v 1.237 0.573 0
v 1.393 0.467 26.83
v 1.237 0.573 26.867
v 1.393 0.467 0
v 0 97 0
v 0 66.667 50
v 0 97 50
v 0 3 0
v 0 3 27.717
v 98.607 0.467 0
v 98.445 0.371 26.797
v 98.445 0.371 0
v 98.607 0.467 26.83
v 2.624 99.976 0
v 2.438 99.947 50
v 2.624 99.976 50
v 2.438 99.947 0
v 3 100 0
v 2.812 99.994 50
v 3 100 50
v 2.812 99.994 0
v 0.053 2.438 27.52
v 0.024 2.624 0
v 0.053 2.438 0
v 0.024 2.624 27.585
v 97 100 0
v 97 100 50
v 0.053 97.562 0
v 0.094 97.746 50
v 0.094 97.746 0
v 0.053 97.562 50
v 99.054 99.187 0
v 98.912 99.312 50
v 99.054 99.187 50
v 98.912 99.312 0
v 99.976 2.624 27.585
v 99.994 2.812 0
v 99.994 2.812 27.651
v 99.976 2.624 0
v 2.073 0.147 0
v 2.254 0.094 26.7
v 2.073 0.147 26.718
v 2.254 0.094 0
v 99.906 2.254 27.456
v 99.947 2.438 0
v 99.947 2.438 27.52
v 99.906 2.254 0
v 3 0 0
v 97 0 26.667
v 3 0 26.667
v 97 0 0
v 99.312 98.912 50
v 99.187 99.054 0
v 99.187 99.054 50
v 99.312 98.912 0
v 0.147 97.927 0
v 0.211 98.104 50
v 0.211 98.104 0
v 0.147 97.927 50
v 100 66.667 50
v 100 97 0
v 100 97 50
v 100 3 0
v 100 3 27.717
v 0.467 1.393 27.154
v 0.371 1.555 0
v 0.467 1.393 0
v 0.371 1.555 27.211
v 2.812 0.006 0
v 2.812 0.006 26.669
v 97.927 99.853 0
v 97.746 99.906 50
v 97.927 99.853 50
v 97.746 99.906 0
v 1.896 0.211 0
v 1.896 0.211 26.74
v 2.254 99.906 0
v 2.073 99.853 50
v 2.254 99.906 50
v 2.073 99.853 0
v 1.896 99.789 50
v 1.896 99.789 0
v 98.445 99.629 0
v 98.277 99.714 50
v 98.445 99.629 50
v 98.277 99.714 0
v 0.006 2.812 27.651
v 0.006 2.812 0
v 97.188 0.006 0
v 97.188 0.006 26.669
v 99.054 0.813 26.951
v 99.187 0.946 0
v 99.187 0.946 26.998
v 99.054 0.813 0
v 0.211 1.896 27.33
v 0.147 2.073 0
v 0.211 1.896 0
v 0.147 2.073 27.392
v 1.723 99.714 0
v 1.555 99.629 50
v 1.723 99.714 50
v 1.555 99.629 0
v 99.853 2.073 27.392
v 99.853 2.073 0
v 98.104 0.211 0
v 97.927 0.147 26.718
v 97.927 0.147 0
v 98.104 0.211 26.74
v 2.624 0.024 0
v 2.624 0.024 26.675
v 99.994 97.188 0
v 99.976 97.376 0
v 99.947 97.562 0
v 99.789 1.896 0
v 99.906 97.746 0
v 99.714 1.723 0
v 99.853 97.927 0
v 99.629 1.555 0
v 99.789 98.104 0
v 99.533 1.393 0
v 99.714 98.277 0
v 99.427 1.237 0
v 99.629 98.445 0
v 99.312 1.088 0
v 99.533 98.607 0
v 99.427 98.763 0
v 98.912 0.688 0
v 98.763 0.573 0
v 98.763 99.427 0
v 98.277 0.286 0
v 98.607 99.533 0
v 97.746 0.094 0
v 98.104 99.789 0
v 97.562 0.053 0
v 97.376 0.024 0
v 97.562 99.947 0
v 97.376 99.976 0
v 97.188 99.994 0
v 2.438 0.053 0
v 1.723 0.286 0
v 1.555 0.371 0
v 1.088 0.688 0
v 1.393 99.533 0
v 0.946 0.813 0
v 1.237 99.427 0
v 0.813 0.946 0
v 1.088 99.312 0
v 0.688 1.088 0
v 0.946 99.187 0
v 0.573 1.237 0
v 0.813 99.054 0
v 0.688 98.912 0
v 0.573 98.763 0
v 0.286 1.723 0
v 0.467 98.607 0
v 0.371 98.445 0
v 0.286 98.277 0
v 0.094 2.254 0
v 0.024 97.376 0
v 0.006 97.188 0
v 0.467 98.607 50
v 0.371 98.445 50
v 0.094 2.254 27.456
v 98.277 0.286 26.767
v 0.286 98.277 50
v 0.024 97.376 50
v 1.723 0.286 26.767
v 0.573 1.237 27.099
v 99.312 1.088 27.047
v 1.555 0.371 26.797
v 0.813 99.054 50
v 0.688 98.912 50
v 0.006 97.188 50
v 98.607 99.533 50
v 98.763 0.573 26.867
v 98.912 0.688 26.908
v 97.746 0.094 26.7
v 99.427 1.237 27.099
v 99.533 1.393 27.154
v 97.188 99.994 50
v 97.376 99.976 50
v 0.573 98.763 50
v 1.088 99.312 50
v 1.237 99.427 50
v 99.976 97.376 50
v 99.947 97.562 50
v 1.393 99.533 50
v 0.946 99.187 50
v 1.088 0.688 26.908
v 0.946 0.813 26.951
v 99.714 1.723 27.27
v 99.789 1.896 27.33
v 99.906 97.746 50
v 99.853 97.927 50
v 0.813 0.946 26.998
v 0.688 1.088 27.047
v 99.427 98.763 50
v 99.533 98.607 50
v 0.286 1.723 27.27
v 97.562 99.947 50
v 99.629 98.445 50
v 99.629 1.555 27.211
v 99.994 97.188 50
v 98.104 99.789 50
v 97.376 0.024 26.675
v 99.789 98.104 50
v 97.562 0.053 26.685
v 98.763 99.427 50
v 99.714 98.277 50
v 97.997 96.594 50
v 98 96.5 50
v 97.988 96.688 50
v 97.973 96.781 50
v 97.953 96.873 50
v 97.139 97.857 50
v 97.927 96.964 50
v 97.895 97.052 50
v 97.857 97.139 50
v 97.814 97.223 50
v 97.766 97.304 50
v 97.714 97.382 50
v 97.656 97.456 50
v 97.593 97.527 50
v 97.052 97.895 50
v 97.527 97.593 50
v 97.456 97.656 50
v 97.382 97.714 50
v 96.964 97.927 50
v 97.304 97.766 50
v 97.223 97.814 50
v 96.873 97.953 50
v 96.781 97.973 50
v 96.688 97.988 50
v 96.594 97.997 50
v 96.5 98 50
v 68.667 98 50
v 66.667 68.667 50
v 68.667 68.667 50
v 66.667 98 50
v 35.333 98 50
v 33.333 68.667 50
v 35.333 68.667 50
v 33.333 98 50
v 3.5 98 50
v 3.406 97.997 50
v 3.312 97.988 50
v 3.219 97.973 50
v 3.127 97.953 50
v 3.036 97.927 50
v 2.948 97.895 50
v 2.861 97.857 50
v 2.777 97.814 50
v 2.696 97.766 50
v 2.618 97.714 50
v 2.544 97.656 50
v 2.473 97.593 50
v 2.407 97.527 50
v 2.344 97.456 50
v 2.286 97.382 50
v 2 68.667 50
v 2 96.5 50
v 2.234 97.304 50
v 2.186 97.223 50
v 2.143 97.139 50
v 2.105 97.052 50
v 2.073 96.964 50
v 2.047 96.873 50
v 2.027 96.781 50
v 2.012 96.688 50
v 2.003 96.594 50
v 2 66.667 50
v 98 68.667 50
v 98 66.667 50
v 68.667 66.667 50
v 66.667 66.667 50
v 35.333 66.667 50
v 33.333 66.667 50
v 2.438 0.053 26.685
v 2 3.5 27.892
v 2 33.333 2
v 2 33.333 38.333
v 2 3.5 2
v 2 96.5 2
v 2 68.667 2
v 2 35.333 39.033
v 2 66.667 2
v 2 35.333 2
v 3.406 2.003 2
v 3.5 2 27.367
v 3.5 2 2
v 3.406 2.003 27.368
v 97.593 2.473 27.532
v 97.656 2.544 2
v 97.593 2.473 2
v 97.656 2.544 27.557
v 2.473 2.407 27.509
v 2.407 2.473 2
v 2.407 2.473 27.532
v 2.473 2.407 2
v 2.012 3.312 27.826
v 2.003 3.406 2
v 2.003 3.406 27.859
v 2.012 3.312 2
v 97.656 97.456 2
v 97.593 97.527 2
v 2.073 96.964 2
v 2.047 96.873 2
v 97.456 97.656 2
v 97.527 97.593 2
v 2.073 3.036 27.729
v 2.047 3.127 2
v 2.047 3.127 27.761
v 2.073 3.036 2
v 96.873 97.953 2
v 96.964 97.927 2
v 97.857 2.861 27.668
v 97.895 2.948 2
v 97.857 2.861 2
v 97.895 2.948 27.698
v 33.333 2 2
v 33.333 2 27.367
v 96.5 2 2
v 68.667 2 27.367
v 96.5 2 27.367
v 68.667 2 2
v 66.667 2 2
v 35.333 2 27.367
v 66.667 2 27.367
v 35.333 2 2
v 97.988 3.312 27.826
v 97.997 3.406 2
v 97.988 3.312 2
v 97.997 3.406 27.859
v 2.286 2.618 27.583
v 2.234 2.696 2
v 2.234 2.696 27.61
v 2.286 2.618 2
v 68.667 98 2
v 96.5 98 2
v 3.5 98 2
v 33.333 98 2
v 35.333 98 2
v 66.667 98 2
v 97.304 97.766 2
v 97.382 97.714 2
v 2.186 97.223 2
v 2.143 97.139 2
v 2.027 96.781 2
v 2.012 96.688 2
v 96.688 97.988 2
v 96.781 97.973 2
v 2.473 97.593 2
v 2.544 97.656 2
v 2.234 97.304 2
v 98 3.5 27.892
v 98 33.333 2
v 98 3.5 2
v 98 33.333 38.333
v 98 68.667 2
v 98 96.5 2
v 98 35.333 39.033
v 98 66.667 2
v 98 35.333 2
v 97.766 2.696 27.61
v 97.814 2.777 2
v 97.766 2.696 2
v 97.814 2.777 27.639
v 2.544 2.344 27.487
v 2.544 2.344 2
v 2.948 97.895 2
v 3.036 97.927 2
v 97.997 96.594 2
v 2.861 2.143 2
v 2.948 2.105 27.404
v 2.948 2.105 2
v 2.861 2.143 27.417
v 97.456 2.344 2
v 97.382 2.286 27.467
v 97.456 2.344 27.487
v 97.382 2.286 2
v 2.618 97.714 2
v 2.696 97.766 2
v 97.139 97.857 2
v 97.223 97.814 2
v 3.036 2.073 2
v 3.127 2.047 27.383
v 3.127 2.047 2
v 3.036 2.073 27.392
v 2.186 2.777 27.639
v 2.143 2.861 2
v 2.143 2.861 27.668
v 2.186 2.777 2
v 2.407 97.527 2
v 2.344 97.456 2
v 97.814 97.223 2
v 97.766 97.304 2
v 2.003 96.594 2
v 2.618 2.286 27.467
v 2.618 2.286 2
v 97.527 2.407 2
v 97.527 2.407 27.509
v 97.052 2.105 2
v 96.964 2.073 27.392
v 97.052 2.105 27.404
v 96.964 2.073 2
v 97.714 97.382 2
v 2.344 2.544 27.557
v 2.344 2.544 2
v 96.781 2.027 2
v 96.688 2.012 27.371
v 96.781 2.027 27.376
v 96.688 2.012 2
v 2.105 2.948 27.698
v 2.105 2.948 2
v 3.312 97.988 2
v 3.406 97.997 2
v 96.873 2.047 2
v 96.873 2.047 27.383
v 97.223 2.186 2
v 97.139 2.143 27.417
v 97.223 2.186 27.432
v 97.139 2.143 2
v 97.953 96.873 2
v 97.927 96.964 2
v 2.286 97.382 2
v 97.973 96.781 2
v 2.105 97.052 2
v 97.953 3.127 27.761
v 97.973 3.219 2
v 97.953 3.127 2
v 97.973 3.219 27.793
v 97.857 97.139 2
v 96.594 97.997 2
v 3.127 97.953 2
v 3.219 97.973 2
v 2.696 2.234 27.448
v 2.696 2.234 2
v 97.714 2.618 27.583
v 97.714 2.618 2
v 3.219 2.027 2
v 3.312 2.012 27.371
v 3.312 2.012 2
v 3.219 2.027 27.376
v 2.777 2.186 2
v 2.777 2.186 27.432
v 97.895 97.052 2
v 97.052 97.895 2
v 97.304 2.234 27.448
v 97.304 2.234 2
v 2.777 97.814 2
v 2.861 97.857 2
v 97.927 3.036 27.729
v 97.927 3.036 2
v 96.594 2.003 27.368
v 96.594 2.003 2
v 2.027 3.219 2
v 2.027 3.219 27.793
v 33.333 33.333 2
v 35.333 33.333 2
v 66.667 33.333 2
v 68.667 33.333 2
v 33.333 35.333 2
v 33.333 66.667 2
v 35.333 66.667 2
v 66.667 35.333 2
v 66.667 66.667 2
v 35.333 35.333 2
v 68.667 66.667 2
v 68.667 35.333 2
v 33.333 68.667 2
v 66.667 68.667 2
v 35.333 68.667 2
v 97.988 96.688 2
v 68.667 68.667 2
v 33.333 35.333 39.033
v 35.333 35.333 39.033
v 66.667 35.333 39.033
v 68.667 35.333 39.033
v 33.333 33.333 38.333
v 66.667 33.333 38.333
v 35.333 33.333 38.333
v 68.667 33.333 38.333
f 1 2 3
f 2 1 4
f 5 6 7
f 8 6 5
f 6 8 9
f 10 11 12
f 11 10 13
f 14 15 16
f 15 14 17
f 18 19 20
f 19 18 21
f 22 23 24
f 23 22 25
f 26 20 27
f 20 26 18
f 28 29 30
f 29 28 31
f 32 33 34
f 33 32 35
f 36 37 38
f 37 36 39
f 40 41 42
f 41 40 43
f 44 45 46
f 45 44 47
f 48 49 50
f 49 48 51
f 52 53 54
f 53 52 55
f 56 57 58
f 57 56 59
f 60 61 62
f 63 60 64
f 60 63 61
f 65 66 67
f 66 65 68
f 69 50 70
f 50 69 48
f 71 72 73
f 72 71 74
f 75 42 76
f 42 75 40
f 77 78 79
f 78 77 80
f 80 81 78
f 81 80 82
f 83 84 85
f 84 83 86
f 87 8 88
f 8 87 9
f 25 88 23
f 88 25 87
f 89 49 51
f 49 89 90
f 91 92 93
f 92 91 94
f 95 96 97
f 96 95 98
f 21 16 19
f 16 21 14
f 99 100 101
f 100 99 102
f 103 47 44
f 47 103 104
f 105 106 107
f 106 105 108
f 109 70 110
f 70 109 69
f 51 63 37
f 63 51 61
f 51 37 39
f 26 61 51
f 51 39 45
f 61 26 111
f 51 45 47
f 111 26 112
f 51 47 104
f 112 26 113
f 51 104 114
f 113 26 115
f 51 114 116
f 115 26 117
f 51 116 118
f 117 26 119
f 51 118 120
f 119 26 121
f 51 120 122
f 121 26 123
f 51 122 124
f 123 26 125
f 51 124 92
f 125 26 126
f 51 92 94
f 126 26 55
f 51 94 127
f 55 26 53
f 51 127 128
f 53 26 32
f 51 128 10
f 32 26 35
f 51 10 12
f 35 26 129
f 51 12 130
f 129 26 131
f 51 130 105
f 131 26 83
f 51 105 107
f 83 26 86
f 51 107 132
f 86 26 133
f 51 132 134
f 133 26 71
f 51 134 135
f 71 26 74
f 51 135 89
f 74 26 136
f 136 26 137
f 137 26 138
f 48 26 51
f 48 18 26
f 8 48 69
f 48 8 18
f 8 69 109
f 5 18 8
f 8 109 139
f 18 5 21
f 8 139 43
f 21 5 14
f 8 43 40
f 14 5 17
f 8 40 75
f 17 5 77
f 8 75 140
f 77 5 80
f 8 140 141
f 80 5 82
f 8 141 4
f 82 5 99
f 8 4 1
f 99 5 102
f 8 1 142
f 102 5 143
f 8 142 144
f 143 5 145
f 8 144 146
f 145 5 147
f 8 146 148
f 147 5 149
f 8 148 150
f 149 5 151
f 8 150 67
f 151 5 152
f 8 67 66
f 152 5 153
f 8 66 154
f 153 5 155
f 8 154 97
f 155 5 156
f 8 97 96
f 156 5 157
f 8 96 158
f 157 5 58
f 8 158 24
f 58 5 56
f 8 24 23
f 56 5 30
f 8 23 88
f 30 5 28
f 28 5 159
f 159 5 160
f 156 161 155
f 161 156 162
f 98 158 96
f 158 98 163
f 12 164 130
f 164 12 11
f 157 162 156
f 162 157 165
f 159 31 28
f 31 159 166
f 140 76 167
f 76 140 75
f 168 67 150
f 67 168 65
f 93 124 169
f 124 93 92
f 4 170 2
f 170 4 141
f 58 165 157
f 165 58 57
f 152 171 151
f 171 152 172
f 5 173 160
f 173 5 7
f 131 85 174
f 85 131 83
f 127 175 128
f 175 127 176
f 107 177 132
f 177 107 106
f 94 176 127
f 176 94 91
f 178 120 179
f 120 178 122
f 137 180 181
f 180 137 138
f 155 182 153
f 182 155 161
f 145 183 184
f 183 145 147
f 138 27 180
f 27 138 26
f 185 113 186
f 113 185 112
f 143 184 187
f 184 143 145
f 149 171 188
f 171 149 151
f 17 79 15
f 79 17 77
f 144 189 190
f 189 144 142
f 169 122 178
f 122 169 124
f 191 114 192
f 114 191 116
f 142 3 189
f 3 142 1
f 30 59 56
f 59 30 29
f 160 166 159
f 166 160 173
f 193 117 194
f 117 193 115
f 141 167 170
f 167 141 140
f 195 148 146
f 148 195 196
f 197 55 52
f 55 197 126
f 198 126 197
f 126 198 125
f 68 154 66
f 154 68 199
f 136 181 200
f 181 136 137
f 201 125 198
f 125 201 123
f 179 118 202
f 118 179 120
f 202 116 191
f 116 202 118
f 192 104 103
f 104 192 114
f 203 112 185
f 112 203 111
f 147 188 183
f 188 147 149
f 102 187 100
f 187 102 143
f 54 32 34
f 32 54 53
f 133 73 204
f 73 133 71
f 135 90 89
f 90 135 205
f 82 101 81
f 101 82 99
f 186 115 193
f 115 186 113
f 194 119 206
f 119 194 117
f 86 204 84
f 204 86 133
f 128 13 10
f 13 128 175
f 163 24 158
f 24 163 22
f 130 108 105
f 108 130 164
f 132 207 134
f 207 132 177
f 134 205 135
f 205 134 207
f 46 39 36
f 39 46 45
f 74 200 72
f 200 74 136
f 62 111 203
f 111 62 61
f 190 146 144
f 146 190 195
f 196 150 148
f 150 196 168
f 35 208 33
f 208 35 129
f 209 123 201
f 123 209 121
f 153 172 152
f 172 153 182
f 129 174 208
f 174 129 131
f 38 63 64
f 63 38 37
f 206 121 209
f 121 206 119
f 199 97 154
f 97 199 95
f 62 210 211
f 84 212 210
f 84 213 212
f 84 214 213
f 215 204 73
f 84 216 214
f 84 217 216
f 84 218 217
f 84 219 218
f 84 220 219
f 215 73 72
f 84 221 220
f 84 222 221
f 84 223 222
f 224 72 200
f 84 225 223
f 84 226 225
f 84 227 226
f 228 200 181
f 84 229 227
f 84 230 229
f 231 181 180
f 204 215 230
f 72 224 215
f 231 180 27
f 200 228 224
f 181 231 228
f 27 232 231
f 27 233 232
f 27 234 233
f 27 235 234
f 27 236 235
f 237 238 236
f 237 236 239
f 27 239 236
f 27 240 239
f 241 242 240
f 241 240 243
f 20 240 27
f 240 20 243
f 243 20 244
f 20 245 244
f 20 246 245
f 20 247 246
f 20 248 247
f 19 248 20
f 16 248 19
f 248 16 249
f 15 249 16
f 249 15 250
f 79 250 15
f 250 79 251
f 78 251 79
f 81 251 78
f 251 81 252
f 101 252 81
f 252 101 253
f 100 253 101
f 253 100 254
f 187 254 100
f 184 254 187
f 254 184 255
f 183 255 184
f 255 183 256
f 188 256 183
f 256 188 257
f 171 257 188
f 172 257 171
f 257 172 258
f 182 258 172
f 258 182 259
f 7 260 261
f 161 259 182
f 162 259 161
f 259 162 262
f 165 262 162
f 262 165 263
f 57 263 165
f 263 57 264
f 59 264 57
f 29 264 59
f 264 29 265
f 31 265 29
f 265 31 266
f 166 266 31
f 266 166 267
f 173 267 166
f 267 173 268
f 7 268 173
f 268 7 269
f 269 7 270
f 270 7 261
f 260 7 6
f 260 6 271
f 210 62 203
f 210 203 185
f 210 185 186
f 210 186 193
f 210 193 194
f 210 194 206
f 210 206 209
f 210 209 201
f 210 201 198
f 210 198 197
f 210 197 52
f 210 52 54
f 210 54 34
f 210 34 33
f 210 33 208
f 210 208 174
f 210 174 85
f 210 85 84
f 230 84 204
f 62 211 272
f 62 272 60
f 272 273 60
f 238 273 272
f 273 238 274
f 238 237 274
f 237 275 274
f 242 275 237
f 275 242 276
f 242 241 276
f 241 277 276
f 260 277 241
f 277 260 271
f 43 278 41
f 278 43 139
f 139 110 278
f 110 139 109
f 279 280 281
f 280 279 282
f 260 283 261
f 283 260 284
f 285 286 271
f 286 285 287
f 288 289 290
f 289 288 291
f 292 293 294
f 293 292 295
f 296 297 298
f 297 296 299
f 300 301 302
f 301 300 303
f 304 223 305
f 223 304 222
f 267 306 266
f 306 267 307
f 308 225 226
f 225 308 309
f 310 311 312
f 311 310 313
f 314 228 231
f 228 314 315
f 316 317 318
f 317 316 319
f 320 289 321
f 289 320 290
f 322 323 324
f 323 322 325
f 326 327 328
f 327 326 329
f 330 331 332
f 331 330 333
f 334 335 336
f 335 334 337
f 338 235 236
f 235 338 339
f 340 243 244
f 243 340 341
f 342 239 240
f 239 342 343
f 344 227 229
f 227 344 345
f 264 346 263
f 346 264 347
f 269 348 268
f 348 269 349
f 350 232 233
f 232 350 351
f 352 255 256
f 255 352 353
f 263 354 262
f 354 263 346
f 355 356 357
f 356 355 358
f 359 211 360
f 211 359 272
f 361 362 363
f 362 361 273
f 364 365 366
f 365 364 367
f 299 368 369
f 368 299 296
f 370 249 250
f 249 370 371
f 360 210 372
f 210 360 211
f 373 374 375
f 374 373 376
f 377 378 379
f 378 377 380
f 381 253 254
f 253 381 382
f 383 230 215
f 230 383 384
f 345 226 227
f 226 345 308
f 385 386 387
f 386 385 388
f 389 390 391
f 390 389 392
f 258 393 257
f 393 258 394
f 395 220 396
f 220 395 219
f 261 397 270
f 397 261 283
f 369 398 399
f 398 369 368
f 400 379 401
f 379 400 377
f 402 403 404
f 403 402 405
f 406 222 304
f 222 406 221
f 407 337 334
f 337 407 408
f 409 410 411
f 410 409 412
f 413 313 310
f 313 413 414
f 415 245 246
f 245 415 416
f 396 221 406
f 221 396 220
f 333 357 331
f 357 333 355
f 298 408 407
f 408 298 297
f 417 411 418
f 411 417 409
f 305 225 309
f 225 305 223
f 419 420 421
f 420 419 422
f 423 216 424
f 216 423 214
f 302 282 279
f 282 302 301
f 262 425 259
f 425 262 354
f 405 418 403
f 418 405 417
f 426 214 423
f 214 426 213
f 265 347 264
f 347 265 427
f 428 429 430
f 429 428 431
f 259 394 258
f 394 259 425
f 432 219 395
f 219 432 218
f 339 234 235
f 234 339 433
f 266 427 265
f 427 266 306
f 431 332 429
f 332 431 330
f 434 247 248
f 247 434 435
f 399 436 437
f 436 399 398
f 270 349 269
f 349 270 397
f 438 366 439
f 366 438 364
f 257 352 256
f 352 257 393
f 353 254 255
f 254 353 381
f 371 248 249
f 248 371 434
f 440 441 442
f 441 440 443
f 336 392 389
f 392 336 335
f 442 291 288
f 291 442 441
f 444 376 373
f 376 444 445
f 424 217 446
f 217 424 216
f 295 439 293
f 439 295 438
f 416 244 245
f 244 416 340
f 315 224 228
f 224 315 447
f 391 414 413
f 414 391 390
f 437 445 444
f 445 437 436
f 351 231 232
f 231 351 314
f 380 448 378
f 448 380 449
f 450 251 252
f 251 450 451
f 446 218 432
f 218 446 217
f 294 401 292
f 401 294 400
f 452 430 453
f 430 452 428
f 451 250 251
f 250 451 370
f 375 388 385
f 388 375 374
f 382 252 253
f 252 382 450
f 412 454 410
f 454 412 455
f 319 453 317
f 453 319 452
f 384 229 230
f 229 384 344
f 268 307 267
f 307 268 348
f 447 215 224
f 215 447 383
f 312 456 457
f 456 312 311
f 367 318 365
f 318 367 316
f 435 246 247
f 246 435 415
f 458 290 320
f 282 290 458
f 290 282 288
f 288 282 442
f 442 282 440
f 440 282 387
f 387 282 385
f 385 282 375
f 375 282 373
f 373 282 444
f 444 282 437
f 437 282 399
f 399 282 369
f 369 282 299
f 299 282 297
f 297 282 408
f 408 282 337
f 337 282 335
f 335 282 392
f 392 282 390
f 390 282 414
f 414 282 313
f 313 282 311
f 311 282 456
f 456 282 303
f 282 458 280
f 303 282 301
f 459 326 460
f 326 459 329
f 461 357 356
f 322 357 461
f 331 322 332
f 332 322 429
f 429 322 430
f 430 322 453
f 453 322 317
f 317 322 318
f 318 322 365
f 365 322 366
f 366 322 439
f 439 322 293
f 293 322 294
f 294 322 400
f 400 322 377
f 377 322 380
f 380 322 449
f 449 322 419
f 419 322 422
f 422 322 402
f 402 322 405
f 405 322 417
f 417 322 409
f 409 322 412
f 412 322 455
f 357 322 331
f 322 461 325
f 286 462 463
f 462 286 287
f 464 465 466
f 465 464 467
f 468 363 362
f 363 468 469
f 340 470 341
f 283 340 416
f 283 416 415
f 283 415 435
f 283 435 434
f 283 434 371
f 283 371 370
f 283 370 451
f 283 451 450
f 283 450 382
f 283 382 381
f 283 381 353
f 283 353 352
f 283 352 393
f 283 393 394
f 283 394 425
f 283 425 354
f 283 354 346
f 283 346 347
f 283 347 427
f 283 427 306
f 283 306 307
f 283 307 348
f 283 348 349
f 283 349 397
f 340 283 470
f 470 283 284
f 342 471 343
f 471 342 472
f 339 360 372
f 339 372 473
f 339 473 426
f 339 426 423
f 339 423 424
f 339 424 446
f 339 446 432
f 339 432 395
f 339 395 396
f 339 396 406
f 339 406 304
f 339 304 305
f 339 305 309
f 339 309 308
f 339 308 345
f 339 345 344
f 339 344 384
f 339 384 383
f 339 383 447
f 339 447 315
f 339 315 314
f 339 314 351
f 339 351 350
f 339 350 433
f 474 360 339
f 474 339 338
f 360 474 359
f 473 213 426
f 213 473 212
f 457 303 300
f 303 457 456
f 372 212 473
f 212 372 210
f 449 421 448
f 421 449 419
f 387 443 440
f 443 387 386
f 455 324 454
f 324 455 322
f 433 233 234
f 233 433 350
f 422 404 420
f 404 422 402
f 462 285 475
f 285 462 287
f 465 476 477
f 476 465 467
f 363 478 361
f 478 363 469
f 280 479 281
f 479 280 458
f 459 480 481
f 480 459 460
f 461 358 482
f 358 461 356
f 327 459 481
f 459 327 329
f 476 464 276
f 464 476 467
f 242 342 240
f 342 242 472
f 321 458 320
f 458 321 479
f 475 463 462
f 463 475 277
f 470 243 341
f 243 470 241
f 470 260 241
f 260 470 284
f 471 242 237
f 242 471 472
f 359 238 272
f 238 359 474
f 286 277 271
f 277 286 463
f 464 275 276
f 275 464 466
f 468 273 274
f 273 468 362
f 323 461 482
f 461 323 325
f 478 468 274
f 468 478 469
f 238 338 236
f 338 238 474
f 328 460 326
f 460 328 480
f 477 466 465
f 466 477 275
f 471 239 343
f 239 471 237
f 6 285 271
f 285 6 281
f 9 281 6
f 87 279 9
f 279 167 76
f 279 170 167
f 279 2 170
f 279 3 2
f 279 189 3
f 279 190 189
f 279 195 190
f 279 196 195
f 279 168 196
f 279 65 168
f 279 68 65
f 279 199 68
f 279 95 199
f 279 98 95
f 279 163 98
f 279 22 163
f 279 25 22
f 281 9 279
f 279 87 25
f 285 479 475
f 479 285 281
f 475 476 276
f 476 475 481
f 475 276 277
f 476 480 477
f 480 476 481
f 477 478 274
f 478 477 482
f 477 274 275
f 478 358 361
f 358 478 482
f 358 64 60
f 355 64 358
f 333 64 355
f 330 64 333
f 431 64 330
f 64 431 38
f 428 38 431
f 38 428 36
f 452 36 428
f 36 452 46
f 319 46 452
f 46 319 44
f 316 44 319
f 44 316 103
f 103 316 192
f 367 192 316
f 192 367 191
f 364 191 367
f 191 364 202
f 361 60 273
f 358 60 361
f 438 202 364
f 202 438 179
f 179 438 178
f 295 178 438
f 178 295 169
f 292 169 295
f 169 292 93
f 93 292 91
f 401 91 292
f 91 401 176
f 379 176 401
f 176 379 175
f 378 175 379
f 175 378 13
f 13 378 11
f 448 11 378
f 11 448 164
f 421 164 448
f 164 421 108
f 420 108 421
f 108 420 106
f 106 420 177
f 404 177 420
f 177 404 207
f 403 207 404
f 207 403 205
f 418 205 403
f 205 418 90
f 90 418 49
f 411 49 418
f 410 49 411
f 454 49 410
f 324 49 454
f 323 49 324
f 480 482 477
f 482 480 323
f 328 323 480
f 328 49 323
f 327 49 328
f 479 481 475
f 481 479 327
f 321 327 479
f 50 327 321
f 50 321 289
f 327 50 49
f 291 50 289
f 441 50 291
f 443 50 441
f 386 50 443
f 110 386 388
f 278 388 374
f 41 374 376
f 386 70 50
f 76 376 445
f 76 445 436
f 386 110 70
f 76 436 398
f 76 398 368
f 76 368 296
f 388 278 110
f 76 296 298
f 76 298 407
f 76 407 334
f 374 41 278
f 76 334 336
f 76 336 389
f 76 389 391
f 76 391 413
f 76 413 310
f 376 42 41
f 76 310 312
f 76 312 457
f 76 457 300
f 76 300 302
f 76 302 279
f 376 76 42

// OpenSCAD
$fn = 100;
xlength = 100;
ywidth = 100;
zheight = 50;
corner = 3; // radius
wall = 2; // thickness
divisions = 3;
bottom = 15; // less than zheight

difference()
{
    base();

    // trianglular cutout
    translate([xlength*1.1,-(ywidth/divisions),zheight])
        rotate([270,0,90])
            linear_extrude(height=xlength*1.2)
                polygon(points=[[0,-wall],[0,zheight-bottom],[ywidth,0]]);
}

module base()
{
    // hollow box with rounded corners
    difference()
    {
        roundedBox(xlength, ywidth, zheight, corner);
        translate([wall,wall,wall]) roundedBox(xlength-2*wall, ywidth-2*wall, zheight, corner/2);
    }

    // dividers
    for(i = [1 : 1 : divisions-1])
    {
        translate([0,ywidth/divisions*i,wall]) cube([xlength,wall,zheight-wall]);
        translate([xlength/divisions*i,0,wall]) cube([wall,ywidth,zheight-wall]);
    }
}

module roundedBox(xdim, ydim, zdim, rdim)
{
    hull()
    {
        translate([rdim,rdim,0]) cylinder(h=zdim,r=rdim);
        translate([xdim-rdim,rdim,0]) cylinder(h=zdim,r=rdim);
        translate([rdim,ydim-rdim,0]) cylinder(h=zdim,r=rdim);
        translate([xdim-rdim,ydim-rdim,0]) cylinder(h=zdim,r=rdim);
    }
}
